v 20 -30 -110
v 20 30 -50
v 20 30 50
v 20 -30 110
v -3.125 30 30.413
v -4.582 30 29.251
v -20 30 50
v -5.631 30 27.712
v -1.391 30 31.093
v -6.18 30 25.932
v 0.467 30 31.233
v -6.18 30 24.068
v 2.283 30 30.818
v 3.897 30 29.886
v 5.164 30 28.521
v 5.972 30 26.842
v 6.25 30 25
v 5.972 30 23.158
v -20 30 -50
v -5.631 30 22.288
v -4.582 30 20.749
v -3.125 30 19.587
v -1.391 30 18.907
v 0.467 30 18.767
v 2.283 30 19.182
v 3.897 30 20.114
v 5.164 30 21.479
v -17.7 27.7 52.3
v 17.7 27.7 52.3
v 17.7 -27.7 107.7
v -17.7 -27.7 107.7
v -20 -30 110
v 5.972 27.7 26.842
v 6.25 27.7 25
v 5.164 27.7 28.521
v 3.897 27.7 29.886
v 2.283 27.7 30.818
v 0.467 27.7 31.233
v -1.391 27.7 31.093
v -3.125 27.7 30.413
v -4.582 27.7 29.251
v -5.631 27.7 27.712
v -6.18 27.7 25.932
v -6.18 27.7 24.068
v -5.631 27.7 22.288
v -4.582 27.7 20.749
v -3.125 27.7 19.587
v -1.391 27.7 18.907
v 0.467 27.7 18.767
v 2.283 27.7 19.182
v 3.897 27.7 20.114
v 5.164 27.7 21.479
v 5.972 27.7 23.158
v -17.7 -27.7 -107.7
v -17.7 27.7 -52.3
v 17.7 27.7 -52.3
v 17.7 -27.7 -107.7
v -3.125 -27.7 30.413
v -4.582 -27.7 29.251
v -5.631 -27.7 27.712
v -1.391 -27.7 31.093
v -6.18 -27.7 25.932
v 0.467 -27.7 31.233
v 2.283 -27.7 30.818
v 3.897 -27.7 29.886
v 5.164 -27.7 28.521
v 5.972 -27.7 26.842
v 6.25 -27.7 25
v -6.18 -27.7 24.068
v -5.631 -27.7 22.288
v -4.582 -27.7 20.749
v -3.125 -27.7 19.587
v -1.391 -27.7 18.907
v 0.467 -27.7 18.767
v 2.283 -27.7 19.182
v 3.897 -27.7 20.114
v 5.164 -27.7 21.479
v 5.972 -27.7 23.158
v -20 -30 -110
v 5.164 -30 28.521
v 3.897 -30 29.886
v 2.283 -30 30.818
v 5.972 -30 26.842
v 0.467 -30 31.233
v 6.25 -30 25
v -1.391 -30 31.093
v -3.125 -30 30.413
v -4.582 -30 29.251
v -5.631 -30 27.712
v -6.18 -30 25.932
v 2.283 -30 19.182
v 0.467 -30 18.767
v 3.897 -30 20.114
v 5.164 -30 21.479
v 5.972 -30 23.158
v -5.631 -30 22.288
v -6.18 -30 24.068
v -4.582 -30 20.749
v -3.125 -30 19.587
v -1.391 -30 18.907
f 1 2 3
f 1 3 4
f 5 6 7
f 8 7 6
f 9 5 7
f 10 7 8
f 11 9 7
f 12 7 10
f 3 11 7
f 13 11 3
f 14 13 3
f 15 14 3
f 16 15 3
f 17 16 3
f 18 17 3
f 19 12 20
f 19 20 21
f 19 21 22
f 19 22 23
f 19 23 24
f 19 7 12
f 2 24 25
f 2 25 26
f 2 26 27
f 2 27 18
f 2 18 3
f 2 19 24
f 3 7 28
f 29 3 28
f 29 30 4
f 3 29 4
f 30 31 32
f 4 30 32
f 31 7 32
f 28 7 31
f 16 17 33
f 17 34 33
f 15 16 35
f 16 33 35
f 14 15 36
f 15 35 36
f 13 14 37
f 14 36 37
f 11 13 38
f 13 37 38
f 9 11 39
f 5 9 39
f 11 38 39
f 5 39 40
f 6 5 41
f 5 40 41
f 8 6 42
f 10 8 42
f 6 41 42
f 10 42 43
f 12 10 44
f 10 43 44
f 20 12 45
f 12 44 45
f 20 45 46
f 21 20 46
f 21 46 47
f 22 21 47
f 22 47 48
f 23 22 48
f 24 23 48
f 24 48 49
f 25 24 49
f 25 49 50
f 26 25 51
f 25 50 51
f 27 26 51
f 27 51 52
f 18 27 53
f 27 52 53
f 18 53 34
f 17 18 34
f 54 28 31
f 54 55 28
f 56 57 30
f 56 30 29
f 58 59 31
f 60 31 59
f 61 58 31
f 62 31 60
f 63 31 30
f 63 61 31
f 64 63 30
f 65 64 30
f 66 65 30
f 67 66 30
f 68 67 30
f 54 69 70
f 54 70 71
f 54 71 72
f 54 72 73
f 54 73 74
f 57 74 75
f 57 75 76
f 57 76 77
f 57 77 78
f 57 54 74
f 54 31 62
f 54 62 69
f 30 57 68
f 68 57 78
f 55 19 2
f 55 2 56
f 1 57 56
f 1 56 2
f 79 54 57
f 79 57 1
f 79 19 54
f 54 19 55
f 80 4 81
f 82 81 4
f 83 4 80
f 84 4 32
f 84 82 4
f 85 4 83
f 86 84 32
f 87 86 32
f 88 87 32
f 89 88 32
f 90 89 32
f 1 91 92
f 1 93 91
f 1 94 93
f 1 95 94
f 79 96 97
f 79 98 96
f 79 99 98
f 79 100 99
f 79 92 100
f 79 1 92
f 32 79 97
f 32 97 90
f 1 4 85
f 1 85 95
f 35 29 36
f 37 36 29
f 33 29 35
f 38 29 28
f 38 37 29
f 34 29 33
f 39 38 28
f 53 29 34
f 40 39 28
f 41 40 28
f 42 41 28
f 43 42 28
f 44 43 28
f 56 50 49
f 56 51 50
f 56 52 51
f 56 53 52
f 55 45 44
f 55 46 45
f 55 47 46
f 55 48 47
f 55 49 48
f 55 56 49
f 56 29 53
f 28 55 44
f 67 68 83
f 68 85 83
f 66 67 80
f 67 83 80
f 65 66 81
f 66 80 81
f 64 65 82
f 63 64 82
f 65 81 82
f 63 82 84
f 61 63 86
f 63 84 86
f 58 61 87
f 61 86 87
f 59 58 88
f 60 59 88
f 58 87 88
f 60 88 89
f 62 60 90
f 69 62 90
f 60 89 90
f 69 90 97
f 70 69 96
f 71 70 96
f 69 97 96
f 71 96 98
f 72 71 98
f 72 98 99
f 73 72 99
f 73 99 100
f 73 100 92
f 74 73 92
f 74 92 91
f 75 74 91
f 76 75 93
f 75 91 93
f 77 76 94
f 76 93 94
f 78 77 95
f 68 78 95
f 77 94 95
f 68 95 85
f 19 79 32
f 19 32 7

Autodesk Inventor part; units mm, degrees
ref_plane "YZ Plane" through (0, 0, 0) normal (1, 0, 0) x (0, 1, 0)
ref_plane "XZ Plane" through (0, 0, 0) normal (0, 1, 0) x (-1, 0, 0)
ref_plane "XY Plane" through (0, 0, 0) normal (0, 0, 1) x (1, 0, 0)
sketch "スケッチ1" plane through (0, 0, 0) normal (0, 0, 1) x (1, 0, 0)
  line L0 (-20, 30) -> (20, 30)
  line L1 (20, 30) -> (20, -30)
  line L2 (20, -30) -> (-20, -30)
  line L3 (-20, -30) -> (-20, 30)
  line L4 (-20, 30) -> (20, -30) construction
  line L5 (20, 30) -> (-20, -30) construction
  line L6 (17.7, 27.7) -> (-17.7, 27.7)
  line L7 (-17.7, 27.7) -> (-17.7, -27.7)
  line L8 (-17.7, -27.7) -> (17.7, -27.7)
  line L9 (17.7, -27.7) -> (17.7, 27.7)
  point P0 (0, 0)
  dimension "d0" = 40
  dimension "d1" = 60
  dimension "d2" = 2.3
extrude "押し出し1" add sketch "スケッチ1" along normal mid plane 220
chamfer "面取り1" distance 60 angle 45 2 edges at (0, 30, 110) (0, 30, -110)
sketch "スケッチ5" plane through (-20, -30, 110) normal (0, -1, 0) x (1, 0, 0)
  circle A0 centre (20, -85) radius 6.25
  point P0 (20, -110)
  dimension "d14" = 12.5
  dimension "d17" = 25
extrude "押し出し3" cut sketch "スケッチ5" against normal blind 250
properties part number "車軸受け1"
